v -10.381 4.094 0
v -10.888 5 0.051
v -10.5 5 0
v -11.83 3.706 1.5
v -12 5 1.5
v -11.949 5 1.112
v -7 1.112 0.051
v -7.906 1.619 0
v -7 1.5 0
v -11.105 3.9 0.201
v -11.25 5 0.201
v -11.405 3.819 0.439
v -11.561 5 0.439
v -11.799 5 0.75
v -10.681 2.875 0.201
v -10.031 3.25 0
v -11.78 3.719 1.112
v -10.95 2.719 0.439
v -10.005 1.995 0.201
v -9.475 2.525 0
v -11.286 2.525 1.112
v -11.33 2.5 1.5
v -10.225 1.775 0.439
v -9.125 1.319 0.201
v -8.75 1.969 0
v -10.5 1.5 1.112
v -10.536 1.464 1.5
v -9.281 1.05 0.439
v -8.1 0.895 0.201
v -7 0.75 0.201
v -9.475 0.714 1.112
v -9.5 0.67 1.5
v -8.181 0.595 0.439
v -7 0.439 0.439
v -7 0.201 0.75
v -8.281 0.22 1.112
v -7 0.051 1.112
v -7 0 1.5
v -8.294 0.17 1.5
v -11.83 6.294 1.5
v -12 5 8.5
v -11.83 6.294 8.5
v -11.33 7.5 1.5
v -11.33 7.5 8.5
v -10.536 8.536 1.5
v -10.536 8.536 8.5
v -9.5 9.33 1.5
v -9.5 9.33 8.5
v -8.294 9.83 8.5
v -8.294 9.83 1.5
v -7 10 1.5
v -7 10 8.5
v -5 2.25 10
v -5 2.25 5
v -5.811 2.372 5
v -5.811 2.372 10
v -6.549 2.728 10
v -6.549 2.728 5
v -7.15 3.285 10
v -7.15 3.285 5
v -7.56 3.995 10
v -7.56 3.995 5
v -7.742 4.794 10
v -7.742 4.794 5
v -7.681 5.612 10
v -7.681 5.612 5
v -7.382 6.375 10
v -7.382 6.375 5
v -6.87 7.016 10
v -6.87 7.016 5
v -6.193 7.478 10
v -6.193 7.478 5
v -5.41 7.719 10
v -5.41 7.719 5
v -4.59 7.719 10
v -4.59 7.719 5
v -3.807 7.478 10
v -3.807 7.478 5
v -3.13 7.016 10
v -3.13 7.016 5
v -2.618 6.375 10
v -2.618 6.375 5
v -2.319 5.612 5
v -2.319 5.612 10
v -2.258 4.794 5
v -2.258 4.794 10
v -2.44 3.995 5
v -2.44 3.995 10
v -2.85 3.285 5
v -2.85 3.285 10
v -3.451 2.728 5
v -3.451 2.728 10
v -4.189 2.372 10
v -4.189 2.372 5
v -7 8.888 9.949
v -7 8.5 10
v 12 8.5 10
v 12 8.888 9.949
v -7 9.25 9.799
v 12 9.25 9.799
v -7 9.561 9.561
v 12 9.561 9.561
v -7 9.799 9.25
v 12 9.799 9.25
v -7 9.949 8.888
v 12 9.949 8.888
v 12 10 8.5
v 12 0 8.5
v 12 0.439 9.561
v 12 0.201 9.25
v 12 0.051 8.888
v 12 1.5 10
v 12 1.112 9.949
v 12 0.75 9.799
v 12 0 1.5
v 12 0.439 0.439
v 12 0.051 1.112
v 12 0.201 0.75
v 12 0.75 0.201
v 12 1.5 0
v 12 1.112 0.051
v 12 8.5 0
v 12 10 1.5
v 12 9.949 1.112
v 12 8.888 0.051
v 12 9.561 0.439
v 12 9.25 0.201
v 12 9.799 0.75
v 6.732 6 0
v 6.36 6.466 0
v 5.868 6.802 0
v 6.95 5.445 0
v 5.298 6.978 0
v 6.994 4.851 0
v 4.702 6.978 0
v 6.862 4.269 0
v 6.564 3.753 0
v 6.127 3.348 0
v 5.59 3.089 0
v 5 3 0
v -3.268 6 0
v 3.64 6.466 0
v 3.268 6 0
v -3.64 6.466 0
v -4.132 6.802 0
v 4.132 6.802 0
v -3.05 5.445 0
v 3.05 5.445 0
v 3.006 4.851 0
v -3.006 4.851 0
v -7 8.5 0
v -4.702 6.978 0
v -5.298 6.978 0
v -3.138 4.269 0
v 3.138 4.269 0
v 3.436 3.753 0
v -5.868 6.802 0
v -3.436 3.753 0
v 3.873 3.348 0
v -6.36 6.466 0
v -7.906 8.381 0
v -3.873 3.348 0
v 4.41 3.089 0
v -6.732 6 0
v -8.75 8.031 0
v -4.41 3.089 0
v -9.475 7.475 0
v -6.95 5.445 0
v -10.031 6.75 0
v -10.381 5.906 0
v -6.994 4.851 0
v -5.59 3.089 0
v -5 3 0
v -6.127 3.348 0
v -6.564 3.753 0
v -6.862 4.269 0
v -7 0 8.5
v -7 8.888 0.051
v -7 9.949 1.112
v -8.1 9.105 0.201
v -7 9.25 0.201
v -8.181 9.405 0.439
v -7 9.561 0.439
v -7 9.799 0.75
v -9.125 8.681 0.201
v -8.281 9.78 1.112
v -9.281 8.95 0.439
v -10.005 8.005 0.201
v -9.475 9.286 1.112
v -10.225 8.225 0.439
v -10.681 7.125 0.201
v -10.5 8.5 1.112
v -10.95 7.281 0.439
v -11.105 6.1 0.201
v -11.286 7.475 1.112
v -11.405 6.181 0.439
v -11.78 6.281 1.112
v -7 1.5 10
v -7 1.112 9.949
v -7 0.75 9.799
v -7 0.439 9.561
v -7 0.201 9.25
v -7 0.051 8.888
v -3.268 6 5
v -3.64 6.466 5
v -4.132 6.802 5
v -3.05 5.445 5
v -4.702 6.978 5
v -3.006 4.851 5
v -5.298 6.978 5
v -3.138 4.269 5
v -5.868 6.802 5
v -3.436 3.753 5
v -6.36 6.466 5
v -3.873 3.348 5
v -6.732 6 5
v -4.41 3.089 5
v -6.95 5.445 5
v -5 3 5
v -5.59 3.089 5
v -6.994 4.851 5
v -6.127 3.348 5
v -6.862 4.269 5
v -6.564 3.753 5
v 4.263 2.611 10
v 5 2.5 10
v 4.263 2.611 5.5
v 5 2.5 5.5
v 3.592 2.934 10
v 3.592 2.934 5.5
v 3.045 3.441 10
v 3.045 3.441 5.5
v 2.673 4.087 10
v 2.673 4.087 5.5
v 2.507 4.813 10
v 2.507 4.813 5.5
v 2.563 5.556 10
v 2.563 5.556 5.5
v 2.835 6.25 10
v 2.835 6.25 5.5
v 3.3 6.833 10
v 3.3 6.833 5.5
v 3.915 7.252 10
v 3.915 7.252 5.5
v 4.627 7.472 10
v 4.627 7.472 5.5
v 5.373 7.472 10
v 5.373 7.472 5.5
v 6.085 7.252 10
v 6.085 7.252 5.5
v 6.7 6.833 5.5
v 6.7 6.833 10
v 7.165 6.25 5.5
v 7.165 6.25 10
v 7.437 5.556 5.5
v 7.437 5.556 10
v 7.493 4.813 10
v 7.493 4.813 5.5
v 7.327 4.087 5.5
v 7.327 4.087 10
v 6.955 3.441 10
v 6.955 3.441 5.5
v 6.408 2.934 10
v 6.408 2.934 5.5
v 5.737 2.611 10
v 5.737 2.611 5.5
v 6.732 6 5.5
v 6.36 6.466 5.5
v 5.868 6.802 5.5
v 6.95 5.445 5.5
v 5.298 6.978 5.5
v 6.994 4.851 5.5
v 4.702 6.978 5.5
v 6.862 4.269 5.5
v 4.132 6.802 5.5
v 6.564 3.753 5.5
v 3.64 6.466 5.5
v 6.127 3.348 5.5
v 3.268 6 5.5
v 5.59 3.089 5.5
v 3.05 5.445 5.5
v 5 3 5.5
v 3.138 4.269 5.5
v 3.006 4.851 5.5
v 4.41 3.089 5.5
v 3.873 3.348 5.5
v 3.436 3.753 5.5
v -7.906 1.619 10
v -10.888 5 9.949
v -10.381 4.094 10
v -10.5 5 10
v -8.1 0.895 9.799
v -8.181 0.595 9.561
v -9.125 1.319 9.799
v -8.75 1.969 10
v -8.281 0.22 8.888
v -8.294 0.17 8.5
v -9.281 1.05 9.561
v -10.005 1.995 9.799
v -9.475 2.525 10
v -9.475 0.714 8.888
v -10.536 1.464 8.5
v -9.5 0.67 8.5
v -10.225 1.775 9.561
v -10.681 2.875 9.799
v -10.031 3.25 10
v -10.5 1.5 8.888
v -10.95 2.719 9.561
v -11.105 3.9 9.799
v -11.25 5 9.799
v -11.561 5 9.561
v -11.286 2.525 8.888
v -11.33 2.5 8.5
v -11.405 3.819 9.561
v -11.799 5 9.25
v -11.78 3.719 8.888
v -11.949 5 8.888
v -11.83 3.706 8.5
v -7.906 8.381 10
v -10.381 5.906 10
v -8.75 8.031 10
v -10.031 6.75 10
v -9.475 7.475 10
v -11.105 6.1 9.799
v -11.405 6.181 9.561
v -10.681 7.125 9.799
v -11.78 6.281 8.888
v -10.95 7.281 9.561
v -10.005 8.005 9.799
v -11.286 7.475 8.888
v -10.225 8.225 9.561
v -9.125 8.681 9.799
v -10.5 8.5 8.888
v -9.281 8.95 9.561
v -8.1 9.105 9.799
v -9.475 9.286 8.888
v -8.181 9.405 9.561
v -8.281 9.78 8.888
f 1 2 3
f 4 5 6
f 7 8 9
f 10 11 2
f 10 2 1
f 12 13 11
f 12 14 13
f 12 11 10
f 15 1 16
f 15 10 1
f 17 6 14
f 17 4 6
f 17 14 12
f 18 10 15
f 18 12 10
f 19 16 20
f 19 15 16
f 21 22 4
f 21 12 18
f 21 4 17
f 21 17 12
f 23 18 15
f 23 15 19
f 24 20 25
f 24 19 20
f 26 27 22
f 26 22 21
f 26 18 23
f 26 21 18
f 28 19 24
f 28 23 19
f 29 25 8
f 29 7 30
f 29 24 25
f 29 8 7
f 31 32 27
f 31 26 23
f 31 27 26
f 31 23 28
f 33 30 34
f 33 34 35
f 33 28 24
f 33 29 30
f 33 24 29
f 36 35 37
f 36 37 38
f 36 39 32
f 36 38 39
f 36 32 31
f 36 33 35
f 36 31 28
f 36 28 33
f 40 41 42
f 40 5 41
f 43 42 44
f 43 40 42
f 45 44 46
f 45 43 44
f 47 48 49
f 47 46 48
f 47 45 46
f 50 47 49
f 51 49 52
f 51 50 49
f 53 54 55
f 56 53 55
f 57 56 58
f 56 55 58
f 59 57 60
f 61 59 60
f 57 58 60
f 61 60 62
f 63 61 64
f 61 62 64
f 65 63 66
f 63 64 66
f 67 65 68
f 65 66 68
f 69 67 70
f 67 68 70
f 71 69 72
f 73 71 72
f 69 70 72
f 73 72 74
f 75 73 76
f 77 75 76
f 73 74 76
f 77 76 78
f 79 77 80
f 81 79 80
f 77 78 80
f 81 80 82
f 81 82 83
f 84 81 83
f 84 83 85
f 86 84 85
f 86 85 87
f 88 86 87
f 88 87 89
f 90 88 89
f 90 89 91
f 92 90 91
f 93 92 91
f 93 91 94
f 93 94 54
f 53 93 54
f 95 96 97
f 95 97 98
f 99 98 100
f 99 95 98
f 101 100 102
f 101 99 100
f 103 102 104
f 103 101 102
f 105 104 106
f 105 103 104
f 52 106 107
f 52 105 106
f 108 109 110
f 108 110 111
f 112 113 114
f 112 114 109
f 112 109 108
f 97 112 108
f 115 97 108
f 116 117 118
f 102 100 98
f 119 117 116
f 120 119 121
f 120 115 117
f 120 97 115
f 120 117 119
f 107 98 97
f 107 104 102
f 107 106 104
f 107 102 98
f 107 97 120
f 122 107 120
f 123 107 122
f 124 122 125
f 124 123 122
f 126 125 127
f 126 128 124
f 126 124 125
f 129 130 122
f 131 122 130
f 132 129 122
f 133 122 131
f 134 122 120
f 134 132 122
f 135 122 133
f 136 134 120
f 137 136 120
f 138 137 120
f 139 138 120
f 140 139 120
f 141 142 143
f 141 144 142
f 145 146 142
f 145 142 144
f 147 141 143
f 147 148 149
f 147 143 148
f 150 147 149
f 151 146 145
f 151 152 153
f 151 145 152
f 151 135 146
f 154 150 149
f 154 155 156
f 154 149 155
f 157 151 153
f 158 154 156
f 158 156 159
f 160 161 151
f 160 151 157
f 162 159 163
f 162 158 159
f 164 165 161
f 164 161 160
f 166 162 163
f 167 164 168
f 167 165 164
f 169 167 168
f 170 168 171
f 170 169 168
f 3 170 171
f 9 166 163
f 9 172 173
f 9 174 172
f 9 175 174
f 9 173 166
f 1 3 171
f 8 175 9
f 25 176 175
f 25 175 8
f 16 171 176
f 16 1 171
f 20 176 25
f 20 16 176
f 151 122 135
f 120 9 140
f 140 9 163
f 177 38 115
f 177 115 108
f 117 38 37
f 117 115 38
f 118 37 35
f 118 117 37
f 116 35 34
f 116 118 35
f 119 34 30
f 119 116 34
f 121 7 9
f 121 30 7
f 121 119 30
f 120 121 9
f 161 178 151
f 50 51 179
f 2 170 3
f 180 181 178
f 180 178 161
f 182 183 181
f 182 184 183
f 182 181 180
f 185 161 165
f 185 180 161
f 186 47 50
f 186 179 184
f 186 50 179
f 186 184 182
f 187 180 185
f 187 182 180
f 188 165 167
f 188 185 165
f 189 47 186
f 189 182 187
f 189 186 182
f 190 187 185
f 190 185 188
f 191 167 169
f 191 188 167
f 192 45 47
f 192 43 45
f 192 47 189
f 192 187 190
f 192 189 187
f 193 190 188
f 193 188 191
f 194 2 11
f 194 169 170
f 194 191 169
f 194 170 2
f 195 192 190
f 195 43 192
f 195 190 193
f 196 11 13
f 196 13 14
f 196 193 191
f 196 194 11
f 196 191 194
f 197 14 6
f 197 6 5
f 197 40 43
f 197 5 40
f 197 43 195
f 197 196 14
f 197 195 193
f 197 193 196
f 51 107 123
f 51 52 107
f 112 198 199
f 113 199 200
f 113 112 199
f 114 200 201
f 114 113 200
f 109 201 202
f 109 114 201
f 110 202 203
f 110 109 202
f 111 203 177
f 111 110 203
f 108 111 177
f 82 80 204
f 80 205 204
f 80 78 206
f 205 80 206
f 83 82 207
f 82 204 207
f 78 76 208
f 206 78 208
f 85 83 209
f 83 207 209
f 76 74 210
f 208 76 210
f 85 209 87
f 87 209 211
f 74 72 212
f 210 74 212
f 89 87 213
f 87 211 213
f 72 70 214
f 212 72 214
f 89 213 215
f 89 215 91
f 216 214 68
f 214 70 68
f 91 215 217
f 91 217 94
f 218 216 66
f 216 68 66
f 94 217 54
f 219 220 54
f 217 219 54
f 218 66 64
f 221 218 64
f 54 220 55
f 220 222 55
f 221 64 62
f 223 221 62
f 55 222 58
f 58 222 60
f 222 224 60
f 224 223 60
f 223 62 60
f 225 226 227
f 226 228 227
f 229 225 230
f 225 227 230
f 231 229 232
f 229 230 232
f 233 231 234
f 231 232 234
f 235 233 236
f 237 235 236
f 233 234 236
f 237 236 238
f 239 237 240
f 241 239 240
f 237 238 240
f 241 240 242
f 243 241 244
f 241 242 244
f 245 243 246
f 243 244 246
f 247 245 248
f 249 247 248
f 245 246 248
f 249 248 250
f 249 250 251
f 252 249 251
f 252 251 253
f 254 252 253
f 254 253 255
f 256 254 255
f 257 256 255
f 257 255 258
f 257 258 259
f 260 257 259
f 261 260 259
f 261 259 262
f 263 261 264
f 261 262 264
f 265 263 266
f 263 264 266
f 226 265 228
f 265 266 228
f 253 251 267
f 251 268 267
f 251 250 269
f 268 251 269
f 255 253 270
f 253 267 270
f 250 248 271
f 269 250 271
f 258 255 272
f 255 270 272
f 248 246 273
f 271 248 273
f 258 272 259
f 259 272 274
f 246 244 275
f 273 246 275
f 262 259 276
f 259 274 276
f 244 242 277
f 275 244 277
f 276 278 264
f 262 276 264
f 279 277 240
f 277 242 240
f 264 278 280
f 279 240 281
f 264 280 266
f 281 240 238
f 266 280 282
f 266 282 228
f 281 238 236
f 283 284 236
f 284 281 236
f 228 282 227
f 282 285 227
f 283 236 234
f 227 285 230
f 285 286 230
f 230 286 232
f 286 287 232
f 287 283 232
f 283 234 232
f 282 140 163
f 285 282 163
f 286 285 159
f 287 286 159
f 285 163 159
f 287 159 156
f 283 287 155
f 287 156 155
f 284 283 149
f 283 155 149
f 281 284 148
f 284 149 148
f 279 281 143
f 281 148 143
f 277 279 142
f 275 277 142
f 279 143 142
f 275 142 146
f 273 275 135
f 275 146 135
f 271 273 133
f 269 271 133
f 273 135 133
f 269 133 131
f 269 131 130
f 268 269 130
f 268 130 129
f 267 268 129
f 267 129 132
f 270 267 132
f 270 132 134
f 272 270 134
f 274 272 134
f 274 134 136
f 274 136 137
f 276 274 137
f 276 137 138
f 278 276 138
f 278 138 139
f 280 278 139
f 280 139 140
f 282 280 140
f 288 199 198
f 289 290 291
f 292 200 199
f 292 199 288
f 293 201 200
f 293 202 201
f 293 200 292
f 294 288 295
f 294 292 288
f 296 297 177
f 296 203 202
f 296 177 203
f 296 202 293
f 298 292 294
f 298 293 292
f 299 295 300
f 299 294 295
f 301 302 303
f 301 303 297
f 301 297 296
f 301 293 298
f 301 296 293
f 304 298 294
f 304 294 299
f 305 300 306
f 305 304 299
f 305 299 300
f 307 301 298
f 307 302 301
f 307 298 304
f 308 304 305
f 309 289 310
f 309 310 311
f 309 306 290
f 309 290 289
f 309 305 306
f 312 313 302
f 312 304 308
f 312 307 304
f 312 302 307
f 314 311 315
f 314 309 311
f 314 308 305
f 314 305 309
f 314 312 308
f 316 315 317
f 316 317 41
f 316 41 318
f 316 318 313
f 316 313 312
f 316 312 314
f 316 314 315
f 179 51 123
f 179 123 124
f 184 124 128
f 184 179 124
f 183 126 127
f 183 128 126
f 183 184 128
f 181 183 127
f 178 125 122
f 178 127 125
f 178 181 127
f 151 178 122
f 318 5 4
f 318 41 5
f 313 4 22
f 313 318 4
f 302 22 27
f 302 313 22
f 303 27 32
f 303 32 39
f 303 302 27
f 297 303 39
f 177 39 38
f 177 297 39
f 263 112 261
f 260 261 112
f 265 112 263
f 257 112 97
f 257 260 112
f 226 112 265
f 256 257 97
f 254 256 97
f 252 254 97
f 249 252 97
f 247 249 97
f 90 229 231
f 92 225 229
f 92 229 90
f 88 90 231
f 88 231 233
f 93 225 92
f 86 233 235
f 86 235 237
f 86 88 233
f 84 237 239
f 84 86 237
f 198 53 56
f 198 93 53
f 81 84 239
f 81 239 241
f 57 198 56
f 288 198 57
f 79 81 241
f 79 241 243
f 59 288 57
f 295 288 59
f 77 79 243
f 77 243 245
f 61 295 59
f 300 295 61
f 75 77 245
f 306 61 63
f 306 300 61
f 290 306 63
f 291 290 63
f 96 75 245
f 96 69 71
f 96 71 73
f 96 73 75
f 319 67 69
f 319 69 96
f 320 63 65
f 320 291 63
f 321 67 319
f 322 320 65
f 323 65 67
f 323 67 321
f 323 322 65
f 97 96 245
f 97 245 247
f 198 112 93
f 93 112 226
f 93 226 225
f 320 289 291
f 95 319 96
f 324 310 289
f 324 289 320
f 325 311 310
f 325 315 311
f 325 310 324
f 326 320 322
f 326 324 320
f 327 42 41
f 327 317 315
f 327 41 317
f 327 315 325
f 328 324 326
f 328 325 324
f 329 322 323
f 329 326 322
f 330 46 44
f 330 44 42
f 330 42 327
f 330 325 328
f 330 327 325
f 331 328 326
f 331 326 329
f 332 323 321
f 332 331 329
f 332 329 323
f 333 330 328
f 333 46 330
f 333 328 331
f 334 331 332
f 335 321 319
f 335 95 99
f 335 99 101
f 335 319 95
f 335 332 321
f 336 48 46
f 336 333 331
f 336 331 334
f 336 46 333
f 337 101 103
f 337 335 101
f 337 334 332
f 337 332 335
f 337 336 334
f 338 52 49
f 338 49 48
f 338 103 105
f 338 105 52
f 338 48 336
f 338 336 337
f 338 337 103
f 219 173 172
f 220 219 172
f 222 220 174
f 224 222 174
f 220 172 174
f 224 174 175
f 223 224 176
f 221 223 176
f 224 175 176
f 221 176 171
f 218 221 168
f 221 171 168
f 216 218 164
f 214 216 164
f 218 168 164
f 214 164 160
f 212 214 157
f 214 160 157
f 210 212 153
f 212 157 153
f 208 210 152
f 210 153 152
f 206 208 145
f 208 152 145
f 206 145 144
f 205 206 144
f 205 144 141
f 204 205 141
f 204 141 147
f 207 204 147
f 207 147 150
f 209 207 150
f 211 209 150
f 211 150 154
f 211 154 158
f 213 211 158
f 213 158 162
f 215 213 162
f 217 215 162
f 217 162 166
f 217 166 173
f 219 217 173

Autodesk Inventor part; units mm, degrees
ref_plane "YZ Plane" through (0, 0, 0) normal (1, 0, 0) x (0, 1, 0)
ref_plane "XZ Plane" through (0, 0, 0) normal (0, 1, 0) x (-1, 0, 0)
ref_plane "XY Plane" through (0, 0, 0) normal (0, 0, 1) x (1, 0, 0)
sketch "Sketch8" plane through (0, 0, 0) normal (0, 0, 1) x (1, 0, 0)
  line L0 (0, 0) -> (-10, 0)
  line L1 (-10, 0) -> (-10, 10)
  line L2 (-10, 10) -> (0, 10)
  line L3 (0, 10) -> (0, 0)
  dimension "d38" = 10
  dimension "d39" = 10
extrude "Extrusion5" add sketch "Sketch8" along normal blind 10
sketch "Sketch9" plane through (0, 0, 10) normal (0, 0, 1) x (1, 0, 0)
  point P0 (0, 0)
  point P1 (-5, 5)
hole "Hole3" at (-5, 5, 10) direction (0, 0, -1) diameter 4 depth 10 counterbore diameter 5.5 counterbore depth 5
sketch "Sketch14" plane through (-10, 0, 0) normal (-1, 0, 0) x (0, 0, 1)
  line L0 (0, 0) -> (10, 0)
  line L1 (10, 0) -> (10, 10)
  line L2 (10, 10) -> (0, 10)
  line L3 (0, 10) -> (0, 0)
  dimension "d71" = 10
  dimension "d72" = 10
extrude "Extrusion9" add sketch "Sketch14" along normal blind 2
fillet "Fillet1" radius 5 2 edges at (-12, 10, 5) (-12, 0, 5)
sketch "Sketch15" plane through (0, 0, 0) normal (1, 0, 0) x (0, 0, -1)
  line L0 (-10, 0) -> (-10, 10) projected
  line L1 (0, 0) -> (-10, 0)
  line L2 (-10, 0) -> (-10, 10)
  line L3 (-10, 10) -> (0, 10)
  line L4 (0, 10) -> (0, 0)
  dimension "d76" = 10
  dimension "d77" = 10
extrude "Extrusion10" add sketch "Sketch15" along normal blind 10
sketch "Sketch16" plane through (0, 0, 10) normal (0, 0, 1) x (1, 0, 0)
  point P0 (0, 0)
  point P1 (5, 5)
hole "Hole5" at (5, 5, 10) direction (0, 0, -1) diameter 4 depth 10 counterbore diameter 5 counterbore depth 4.5
sketch "Sketch17" plane through (10, 0, 0) normal (1, 0, 0) x (0, 0, -1)
  line L0 (0, 0) -> (-10, 0)
  line L1 (-10, 0) -> (-10, 10)
  line L2 (-10, 10) -> (0, 10)
  line L3 (0, 10) -> (0, 0)
  dimension "d87" = 10
  dimension "d88" = 10
extrude "Extrusion11" add sketch "Sketch17" along normal blind 2
fillet "Fillet2" radius 1.5 6 edges at (-10.5357, 8.5357, 10) (2.4997, 0, 10) (2.4998, 10, 10) (-10.5357, 8.5357, 0) (2.4997, 0, 0) (2.4998, 10, 0)
properties part number "Hole_TestFits"
